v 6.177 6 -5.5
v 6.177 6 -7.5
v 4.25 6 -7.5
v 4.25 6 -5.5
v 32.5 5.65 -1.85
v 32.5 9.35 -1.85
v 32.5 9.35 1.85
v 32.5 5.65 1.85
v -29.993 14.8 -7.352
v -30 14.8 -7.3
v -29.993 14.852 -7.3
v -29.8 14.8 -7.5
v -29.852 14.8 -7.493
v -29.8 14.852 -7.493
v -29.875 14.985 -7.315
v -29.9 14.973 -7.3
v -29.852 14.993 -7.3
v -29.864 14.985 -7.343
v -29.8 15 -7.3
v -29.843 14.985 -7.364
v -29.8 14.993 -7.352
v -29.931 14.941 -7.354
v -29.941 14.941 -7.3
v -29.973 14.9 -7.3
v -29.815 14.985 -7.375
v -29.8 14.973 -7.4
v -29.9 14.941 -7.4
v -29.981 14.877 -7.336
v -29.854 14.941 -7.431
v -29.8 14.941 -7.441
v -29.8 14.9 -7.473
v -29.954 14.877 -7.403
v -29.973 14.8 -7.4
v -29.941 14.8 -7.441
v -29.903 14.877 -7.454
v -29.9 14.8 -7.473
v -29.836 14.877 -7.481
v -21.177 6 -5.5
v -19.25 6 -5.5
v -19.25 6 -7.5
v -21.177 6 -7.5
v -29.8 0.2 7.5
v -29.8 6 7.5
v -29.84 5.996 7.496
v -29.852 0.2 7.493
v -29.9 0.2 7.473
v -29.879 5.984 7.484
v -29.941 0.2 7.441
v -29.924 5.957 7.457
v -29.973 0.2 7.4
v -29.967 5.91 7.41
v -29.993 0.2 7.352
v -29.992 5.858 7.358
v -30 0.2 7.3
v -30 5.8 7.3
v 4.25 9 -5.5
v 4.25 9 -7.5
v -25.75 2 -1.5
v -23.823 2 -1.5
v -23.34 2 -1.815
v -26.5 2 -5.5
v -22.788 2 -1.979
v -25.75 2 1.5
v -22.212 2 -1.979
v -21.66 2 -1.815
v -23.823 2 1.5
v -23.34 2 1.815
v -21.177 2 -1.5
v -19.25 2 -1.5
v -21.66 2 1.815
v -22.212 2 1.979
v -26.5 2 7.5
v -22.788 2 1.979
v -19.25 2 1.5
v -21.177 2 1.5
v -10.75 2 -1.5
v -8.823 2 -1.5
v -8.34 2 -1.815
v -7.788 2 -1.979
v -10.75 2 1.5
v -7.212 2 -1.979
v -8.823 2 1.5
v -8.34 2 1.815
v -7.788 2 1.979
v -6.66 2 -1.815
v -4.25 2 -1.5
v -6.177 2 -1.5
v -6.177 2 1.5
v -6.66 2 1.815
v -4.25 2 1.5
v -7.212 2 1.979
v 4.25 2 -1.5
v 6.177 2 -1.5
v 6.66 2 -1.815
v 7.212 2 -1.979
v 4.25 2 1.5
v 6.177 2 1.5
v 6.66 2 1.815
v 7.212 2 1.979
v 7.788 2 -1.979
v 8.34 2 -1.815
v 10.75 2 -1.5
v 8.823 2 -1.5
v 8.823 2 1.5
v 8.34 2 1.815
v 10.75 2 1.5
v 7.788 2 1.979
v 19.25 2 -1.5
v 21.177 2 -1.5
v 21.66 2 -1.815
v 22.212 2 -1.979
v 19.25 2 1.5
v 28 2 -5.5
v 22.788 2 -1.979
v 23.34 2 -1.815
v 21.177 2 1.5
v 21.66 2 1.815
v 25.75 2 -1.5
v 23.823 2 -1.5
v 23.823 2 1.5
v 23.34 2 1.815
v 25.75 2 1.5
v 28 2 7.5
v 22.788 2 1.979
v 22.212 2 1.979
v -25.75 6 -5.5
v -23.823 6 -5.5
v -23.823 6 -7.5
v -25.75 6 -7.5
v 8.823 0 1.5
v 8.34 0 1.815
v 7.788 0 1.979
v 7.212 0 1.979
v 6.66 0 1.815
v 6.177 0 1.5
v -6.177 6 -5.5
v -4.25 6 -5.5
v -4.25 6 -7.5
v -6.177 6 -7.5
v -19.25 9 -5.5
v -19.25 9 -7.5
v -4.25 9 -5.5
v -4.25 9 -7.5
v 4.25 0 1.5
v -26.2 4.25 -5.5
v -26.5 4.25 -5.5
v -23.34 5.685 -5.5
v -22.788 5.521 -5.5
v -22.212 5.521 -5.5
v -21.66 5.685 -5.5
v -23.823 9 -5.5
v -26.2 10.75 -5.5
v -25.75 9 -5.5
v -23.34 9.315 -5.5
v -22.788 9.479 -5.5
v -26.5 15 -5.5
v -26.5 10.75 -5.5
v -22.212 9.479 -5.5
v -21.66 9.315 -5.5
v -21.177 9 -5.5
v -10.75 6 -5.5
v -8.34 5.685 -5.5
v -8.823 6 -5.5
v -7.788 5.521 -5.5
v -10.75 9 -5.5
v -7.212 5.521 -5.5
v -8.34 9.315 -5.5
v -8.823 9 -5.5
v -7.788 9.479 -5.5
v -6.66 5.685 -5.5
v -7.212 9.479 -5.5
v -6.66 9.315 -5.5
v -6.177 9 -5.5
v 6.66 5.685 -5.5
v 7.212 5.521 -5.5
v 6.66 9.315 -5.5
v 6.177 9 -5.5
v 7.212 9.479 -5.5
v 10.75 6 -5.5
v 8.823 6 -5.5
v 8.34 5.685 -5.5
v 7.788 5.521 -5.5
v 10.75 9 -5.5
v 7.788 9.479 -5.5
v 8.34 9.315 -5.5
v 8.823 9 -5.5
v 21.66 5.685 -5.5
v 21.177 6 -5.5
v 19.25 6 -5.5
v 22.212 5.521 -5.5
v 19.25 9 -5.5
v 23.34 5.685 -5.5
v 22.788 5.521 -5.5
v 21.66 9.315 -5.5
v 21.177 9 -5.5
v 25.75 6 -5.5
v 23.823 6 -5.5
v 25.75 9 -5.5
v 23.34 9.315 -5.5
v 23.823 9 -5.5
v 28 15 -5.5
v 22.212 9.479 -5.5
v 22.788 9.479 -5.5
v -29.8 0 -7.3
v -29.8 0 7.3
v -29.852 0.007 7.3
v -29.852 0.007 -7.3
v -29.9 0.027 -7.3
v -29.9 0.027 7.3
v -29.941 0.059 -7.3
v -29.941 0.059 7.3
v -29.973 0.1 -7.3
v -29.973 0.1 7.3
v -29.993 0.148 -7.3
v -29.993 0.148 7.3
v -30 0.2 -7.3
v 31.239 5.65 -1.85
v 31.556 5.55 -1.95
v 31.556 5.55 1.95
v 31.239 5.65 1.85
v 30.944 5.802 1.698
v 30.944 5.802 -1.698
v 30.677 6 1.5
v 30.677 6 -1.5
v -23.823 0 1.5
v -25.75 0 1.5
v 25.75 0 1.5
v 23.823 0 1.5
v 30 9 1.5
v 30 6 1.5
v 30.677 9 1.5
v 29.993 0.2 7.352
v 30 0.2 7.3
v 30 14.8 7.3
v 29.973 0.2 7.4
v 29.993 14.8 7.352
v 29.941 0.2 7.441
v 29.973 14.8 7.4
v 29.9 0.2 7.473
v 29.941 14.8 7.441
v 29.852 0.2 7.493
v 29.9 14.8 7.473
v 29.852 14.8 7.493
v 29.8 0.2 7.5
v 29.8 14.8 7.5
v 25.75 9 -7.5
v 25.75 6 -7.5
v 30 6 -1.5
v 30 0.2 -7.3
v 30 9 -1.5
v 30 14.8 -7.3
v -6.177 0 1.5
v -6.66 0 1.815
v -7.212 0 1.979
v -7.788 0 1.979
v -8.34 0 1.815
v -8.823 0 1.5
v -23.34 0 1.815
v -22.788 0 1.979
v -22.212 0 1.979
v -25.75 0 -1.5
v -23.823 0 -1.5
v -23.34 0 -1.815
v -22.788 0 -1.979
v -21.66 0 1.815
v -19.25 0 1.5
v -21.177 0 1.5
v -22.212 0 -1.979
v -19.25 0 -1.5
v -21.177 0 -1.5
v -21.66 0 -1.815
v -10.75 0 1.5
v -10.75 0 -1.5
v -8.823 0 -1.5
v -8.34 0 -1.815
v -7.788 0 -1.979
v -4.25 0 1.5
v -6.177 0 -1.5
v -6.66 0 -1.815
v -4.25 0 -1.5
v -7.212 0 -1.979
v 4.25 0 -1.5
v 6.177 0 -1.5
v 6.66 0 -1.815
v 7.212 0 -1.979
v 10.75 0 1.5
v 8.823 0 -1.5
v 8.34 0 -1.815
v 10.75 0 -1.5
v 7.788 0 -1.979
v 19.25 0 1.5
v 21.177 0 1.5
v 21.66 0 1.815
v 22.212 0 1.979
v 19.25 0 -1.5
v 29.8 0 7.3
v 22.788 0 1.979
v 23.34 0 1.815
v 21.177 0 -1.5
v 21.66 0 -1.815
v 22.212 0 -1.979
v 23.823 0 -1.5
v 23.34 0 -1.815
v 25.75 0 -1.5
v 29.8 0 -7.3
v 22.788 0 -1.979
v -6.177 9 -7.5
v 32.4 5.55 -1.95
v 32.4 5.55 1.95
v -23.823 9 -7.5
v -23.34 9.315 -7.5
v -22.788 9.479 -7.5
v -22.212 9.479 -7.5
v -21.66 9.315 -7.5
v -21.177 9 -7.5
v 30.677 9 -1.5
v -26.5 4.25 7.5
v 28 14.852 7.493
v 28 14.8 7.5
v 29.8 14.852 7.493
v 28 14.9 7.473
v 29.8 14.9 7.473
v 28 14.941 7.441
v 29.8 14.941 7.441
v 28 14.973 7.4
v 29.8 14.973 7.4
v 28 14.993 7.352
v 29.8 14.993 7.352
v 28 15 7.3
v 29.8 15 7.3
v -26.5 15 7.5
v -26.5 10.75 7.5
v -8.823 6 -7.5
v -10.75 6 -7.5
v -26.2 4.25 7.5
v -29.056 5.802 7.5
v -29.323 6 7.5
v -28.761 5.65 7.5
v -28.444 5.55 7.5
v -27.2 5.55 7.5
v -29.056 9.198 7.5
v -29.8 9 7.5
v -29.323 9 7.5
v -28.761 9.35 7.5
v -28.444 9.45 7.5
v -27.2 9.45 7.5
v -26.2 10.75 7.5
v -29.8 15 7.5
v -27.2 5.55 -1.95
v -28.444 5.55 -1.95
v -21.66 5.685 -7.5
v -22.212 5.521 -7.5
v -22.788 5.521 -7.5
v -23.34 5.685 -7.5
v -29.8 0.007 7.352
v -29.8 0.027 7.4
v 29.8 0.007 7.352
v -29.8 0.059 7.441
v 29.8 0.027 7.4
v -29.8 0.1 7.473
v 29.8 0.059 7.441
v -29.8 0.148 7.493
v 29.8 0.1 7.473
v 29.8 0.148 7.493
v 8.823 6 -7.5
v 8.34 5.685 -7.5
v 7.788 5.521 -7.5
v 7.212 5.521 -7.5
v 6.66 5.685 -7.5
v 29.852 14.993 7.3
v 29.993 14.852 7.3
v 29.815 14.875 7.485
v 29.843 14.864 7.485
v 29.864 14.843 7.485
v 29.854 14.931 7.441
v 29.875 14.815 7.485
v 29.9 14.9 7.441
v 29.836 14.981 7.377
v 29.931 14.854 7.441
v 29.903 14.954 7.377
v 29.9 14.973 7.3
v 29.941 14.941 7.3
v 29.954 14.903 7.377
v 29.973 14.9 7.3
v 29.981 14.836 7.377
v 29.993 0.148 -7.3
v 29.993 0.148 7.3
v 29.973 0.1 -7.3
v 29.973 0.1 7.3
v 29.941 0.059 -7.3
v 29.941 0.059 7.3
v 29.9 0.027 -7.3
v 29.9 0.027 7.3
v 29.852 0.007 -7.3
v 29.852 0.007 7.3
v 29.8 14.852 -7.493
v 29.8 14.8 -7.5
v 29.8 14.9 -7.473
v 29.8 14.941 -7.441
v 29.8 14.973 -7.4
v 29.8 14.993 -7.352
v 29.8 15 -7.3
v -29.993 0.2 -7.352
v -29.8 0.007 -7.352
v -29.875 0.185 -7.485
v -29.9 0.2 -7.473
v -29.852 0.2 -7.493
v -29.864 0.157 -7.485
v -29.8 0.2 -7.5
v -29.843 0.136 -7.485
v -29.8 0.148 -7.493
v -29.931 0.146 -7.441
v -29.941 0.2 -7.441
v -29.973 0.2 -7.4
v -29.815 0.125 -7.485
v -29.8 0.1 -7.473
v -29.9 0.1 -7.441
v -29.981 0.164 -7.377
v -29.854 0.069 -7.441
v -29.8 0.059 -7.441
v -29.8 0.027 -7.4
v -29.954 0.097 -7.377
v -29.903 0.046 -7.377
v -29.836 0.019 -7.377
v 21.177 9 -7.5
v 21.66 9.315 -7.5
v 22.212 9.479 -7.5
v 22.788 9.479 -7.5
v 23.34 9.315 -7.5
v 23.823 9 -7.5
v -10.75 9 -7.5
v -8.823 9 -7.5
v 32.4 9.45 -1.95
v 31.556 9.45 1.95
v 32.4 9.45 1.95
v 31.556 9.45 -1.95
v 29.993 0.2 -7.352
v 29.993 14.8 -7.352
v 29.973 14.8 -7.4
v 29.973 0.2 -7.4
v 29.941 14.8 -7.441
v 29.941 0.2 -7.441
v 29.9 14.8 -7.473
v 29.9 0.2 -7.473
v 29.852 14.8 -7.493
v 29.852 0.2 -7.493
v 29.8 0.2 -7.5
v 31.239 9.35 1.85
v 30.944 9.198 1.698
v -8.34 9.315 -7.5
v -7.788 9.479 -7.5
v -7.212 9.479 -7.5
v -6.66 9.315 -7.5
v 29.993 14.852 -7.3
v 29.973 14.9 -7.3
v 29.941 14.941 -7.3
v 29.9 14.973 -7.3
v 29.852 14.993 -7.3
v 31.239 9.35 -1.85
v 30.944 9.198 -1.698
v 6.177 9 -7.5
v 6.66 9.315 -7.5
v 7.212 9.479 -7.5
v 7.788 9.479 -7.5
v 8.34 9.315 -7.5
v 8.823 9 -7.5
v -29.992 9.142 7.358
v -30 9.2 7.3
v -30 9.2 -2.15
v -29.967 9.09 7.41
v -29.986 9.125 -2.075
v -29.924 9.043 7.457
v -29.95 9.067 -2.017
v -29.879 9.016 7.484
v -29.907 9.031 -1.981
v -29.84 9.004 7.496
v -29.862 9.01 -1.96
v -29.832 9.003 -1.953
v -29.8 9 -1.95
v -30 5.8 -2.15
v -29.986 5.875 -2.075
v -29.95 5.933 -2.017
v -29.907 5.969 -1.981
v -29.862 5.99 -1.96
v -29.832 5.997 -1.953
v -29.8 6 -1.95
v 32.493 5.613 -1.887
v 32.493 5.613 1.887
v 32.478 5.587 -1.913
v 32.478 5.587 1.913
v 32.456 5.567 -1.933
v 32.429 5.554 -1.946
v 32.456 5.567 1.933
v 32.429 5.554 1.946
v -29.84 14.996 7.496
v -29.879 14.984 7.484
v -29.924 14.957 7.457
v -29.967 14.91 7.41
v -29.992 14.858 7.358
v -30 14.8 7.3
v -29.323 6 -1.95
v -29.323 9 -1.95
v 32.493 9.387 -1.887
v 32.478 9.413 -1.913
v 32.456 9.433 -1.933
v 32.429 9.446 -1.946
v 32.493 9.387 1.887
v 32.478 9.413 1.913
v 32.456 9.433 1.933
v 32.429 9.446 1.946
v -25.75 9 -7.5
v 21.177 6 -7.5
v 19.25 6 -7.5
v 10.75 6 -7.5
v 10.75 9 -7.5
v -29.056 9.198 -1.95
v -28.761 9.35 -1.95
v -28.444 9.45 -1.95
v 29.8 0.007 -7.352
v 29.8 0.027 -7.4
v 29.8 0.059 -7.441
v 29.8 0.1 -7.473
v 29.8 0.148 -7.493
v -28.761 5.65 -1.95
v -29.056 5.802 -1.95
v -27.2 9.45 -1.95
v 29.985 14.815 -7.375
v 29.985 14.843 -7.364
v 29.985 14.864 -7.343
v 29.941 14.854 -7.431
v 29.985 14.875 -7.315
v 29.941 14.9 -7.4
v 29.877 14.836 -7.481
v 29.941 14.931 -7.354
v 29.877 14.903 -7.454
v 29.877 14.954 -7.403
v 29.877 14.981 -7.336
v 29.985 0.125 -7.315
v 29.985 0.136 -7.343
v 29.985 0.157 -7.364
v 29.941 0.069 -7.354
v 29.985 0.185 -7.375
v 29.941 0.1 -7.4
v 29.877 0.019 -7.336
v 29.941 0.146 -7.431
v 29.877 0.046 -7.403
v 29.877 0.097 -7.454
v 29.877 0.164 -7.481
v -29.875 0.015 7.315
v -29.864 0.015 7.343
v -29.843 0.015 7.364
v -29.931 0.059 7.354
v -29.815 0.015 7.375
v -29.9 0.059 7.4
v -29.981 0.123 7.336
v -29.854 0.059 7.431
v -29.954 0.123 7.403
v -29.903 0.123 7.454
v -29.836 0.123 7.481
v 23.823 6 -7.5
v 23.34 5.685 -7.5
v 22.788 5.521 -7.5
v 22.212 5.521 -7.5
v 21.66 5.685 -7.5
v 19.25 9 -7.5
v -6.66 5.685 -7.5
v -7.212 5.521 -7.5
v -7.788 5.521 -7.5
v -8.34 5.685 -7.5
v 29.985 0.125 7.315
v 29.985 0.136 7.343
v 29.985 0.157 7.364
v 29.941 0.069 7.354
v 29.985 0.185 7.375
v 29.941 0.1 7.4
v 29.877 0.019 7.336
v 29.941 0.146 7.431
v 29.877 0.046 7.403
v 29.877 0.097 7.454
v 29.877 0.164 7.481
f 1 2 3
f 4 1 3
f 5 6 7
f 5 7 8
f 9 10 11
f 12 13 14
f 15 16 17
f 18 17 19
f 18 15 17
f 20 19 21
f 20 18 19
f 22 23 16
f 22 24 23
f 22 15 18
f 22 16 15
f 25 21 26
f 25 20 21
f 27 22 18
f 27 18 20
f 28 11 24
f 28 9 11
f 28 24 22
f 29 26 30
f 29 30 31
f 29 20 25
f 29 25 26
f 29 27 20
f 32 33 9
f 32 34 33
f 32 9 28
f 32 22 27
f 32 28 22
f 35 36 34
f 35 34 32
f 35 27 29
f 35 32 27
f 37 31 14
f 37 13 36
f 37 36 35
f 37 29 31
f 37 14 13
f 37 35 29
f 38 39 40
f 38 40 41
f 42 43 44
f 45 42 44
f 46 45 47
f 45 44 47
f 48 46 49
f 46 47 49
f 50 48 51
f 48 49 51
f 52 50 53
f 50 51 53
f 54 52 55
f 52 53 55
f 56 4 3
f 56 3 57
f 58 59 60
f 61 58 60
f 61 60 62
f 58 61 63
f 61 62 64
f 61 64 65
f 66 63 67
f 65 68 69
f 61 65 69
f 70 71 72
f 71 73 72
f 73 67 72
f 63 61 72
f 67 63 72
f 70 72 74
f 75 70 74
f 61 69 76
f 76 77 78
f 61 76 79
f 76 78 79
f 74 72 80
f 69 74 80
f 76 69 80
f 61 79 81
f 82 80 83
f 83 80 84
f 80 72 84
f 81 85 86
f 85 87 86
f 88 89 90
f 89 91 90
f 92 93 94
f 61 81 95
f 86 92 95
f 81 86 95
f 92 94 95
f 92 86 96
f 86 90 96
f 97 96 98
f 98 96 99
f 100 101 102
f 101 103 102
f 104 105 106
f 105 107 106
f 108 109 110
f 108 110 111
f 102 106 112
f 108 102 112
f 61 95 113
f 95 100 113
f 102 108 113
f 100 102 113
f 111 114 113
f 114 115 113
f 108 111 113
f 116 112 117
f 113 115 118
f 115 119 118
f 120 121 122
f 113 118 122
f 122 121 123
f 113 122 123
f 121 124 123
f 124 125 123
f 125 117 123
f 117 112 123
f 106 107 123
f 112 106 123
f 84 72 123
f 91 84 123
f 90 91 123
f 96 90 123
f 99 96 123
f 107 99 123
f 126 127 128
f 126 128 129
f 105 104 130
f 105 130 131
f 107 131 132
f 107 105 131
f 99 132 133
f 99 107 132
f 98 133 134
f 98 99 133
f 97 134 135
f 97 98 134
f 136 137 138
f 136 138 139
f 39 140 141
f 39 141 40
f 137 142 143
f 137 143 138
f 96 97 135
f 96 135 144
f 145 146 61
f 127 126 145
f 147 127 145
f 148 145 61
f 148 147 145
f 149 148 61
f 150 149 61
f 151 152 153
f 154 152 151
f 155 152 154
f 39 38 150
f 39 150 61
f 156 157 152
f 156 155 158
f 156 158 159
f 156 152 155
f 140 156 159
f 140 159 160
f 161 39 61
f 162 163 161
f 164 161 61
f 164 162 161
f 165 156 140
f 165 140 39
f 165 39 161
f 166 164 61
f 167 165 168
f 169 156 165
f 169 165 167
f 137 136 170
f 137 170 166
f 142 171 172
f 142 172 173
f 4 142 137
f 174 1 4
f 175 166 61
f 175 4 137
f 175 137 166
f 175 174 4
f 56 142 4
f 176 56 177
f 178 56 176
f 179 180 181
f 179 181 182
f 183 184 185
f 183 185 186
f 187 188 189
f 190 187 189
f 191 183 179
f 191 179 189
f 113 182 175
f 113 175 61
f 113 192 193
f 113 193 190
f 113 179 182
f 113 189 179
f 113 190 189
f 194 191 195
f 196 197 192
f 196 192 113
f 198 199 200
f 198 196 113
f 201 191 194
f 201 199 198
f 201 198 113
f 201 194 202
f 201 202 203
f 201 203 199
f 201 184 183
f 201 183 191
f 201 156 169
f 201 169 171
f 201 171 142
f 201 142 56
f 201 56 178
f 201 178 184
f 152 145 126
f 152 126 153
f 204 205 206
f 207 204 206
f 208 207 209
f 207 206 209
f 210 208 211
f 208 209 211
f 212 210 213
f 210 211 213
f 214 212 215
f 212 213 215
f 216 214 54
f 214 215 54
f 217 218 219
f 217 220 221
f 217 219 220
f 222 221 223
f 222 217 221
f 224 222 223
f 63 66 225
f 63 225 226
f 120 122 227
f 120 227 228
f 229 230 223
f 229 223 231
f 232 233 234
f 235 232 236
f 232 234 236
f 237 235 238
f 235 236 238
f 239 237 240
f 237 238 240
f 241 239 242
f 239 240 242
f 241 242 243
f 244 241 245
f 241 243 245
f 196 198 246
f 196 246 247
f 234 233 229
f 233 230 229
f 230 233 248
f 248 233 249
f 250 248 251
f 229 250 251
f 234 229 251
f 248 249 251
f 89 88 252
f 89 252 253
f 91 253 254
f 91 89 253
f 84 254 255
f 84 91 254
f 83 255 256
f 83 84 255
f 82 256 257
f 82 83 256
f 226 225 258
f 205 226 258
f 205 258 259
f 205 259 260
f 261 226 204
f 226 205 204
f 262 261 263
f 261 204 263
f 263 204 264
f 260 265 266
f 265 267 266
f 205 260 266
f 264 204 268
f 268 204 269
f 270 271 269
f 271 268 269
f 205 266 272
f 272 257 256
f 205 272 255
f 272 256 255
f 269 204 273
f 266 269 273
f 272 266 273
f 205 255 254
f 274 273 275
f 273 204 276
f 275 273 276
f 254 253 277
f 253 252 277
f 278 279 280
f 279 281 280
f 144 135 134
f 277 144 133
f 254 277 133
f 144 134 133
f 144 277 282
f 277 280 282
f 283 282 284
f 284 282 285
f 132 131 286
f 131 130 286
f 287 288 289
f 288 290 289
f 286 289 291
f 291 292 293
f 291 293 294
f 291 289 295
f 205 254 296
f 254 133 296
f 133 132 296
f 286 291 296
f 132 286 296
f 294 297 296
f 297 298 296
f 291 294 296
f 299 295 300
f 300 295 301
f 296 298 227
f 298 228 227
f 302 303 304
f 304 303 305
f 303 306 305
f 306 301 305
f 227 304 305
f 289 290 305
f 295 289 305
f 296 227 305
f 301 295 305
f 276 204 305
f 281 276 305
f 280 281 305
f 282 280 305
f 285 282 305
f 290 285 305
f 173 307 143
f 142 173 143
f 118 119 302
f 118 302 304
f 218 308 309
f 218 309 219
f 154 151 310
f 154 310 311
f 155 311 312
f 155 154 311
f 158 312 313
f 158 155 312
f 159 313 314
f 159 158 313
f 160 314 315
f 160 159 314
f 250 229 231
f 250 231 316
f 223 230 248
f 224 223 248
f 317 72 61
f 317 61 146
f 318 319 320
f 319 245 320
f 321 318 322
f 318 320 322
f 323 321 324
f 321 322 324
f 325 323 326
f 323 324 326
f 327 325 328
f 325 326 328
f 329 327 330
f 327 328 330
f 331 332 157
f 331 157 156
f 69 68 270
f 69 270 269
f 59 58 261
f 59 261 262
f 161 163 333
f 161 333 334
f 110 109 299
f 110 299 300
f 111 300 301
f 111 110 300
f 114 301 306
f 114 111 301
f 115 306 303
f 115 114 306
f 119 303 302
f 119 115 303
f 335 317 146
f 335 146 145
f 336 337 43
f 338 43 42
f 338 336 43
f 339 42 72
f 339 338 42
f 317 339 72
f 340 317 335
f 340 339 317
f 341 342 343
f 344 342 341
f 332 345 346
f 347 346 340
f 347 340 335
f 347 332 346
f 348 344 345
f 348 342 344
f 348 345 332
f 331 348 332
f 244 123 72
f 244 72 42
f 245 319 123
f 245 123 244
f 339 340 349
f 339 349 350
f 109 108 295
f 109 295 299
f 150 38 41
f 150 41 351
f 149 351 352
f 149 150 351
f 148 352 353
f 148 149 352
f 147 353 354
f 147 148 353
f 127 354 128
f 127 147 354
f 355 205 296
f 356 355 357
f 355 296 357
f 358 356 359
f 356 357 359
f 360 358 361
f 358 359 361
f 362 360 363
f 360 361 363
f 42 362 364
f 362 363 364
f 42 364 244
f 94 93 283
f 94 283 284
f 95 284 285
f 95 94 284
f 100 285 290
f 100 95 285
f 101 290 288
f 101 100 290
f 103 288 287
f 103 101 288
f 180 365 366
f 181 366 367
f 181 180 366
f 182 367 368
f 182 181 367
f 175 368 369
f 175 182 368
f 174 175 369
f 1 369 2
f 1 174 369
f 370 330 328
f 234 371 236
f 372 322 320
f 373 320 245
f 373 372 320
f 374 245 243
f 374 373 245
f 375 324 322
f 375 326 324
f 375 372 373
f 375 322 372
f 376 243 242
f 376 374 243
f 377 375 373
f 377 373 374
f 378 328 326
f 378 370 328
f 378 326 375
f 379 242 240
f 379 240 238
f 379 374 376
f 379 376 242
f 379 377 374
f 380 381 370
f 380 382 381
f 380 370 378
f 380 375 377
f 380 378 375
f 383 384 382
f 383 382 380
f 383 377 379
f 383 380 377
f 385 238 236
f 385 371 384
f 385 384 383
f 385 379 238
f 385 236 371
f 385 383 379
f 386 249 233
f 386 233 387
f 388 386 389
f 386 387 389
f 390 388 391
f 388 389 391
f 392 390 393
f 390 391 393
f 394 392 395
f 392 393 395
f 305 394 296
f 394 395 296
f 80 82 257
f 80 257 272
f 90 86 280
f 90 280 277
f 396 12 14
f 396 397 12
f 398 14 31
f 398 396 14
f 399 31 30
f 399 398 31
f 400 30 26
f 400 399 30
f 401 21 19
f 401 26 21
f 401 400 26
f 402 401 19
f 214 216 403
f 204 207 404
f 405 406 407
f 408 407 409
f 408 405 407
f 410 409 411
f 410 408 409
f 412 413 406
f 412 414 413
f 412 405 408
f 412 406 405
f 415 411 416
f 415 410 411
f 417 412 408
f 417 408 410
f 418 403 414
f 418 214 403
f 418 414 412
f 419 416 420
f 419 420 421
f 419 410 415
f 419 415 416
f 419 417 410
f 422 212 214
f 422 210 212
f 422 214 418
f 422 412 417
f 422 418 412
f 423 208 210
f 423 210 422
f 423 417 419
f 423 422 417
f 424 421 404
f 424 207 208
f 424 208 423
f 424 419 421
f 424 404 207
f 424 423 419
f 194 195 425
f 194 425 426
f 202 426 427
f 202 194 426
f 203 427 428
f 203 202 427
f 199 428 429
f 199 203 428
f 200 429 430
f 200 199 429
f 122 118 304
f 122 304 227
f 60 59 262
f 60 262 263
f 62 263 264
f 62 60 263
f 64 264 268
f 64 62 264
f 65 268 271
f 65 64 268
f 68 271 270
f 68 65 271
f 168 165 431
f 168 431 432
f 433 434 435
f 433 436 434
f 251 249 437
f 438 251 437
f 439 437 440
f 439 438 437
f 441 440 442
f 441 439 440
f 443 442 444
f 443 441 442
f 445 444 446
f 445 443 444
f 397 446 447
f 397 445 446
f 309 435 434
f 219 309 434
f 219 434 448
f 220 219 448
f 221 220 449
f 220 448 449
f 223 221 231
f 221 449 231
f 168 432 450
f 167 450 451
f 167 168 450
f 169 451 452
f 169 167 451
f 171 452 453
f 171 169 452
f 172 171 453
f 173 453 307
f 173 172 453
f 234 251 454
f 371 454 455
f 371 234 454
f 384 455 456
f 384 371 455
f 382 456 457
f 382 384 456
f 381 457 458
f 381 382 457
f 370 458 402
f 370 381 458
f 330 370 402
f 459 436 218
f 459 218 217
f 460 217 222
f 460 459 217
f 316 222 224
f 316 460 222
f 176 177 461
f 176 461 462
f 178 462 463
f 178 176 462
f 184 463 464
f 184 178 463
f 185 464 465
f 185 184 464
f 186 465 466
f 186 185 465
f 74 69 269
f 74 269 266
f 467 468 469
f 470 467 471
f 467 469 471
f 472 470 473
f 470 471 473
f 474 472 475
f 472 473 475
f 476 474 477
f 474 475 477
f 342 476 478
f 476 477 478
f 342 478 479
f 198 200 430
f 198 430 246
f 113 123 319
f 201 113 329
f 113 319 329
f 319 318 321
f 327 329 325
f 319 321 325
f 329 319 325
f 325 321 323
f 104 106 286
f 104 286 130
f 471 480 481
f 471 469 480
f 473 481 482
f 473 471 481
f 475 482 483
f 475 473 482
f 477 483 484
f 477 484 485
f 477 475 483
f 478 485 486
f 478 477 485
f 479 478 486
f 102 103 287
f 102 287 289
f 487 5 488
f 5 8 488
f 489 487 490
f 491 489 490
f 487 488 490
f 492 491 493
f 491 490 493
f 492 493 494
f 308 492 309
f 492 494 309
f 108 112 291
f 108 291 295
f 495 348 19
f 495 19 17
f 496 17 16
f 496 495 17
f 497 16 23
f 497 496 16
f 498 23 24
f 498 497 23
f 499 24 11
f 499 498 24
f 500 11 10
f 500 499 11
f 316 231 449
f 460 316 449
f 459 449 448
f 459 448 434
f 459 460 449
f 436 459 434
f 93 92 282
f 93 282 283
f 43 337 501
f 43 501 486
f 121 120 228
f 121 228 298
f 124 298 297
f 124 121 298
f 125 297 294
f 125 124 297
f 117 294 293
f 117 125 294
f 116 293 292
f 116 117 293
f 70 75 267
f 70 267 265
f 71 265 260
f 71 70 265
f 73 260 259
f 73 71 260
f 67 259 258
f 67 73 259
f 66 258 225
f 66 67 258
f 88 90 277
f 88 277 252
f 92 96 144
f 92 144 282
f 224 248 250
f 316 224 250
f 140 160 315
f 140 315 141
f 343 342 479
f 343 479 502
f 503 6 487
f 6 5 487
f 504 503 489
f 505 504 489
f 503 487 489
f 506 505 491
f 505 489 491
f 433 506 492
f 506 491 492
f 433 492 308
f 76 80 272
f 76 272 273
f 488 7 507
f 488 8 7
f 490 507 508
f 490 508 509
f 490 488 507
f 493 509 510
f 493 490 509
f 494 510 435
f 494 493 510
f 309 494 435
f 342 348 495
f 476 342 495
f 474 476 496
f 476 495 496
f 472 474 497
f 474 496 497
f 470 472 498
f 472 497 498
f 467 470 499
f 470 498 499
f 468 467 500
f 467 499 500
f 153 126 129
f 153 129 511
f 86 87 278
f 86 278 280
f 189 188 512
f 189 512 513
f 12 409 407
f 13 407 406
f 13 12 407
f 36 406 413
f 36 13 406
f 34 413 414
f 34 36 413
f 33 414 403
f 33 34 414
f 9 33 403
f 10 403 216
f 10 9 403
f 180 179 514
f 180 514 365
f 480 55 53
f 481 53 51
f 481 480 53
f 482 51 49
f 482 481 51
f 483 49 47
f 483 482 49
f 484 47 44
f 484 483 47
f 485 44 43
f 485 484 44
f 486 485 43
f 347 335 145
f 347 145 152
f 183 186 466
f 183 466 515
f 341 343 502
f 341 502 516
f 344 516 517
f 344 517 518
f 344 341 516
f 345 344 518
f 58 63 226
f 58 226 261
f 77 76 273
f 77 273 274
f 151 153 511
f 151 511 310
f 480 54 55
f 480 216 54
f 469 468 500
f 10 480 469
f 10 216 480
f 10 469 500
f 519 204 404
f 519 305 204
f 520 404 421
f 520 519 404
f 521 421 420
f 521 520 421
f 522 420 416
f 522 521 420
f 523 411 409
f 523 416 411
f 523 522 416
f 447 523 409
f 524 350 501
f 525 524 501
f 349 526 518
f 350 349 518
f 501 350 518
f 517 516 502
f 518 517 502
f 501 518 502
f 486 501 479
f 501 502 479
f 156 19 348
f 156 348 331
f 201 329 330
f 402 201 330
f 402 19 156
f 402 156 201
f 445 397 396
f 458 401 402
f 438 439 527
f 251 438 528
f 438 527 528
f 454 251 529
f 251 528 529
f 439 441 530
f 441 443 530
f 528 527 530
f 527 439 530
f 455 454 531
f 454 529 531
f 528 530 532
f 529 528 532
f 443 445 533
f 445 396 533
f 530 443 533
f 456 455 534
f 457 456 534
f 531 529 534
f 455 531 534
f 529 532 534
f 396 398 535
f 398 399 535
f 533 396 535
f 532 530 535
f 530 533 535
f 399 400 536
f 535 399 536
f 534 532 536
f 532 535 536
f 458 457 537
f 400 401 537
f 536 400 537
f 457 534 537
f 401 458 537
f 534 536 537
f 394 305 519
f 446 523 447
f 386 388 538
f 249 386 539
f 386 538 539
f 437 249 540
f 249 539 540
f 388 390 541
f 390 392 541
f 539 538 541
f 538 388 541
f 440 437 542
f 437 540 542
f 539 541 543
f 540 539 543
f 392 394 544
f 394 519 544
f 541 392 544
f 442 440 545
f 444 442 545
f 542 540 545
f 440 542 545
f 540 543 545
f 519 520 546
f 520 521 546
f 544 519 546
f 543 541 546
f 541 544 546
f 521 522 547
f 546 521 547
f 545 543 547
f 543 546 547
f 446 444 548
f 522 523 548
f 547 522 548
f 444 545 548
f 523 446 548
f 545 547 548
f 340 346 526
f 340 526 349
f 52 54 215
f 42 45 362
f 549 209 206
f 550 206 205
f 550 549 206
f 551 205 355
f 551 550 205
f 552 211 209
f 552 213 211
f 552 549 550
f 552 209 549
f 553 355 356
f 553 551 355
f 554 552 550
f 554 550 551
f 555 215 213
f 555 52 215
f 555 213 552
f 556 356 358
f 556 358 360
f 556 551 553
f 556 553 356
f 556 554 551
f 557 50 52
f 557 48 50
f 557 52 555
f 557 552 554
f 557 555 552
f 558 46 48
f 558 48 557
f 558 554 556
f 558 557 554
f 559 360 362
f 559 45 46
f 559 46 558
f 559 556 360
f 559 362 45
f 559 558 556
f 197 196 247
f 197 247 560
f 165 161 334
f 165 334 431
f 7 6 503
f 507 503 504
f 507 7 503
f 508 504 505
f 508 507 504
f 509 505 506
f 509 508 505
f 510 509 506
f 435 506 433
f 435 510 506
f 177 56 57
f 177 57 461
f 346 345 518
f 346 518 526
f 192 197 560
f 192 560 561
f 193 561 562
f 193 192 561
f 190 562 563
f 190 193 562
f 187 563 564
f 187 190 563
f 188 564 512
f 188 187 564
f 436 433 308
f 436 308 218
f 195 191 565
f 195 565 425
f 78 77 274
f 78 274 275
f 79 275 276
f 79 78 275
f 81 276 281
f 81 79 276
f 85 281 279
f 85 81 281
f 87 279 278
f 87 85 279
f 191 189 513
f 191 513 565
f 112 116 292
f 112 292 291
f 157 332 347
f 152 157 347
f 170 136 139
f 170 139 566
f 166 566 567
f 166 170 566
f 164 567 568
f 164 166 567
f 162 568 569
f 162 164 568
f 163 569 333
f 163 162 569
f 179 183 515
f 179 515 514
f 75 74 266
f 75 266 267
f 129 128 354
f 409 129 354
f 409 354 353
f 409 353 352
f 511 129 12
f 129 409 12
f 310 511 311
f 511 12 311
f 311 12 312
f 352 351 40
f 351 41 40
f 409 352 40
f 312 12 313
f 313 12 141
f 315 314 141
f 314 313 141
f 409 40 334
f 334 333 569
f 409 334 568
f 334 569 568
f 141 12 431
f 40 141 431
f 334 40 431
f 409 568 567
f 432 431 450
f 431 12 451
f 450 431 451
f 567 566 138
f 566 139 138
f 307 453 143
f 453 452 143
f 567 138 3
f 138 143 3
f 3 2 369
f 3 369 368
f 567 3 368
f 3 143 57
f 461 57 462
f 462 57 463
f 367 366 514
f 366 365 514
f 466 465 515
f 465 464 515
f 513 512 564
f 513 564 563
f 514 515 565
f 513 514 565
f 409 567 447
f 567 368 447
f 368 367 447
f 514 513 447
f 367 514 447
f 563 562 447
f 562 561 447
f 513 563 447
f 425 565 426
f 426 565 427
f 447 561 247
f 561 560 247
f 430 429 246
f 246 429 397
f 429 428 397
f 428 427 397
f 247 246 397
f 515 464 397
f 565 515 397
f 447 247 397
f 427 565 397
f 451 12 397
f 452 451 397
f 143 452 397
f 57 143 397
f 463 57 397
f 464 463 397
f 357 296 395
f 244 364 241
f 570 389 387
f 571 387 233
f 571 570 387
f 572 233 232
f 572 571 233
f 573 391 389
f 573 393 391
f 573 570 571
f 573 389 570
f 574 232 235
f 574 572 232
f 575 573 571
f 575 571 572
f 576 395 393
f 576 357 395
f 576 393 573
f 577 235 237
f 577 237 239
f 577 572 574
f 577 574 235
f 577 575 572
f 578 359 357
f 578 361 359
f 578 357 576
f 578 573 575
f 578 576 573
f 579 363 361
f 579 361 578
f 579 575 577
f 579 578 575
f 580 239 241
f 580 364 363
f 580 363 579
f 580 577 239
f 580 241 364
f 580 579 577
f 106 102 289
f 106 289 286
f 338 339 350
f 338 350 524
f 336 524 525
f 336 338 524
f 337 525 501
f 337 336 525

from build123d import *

# Parameters (mm, degrees)
EXTRUDE_1_DEPTH      = 7.5
EXTRUDE_1_DEPTH_BACK = 7.5
SKETCH_1_W           = 60
SKETCH_1_H           = 15
SKETCH_2_W           = 3
SKETCH_2_H           = 3
EXTRUDE_2_DEPTH      = 1
EXTRUDE_3_DEPTH      = 1
EXTRUDE_3_DEPTH_BACK = 4
CUT_EXTRUDE_1_REACH  = 36.667
SKETCH_5_W           = 54.5
SKETCH_5_H           = 13
CUT_EXTRUDE_2_DEPTH  = 13
CUT_EXTRUDE_3_DEPTH  = 9.45
EXTRUDE_4_REACH      = 40.81
SKETCH_7_W           = 0.3
SKETCH_7_H           = 6.5
CUT_EXTRUDE_4_REACH  = 40.082
CUT_EXTRUDE_5_REACH  = 37.798
FILLET_1_R           = 0.1
FILLET_2_R           = 0.2


with BuildPart() as part:
    # Sketch 1 → Extrude 1 (new, two sides: drawn at the far end of the back side and taken through both)
    with BuildSketch(Plane.XY.offset(-EXTRUDE_1_DEPTH_BACK)):
        with Locations((0, 7.5)):
            Rectangle(SKETCH_1_W, SKETCH_1_H)
    extrude(amount=EXTRUDE_1_DEPTH + EXTRUDE_1_DEPTH_BACK)

    # Sketch 2 → Extrude 2 (add)
    with BuildSketch(Plane(origin=(30, 0, 0), x_dir=(0, 0, -1), z_dir=(1, 0, 0))):
        with Locations((0, 7.5)):
            Rectangle(SKETCH_2_W, SKETCH_2_H)
    extrude(amount=EXTRUDE_2_DEPTH)

    # Sketch 3 → Extrude 3 (add, two sides: drawn at the far end of the back side and taken through both)
    with BuildSketch(Plane.XY.offset(1.5).offset(-EXTRUDE_3_DEPTH_BACK)):
        with BuildLine():
            Line((32.5, 9.45), (32.5, 5.55))
            Line((32.5, 5.55), (31.555590279, 5.55))
            ThreePointArc((31.555590279, 5.55), (31.088161527, 5.719957697), (30.677124344, 6))
            Line((30.677124344, 6), (30.677124344, 9))
            ThreePointArc((30.677124344, 9), (31.088161527, 9.280042303), (31.555590279, 9.45))
            Line((31.555590279, 9.45), (32.5, 9.45))
        make_face()
    extrude(amount=EXTRUDE_3_DEPTH + EXTRUDE_3_DEPTH_BACK)

    # Sketch 4 → Cut-Extrude 1 (cut, up to next)
    with BuildSketch(Plane(origin=(0, 9.45, 0), x_dir=(-1, 0, 0), z_dir=(0, 1, 0)), mode=Mode.PRIVATE) as cut_extrude_1_sk1:
        with BuildLine():
            Line((-32.5, -1.95), (-31.555590279, -1.95))
            ThreePointArc((-31.555590279, -1.95), (-31.088161527, -1.780042303), (-30.677124344, -1.5))
            Line((-30.677124344, -1.5), (-30.677124344, -2.5))
            Line((-30.677124344, -2.5), (-32.5, -2.5))
            Line((-32.5, -2.5), (-32.5, -1.95))
        make_face()
    cut_extrude_1_tool1 = extrude(cut_extrude_1_sk1.sketch, amount=-CUT_EXTRUDE_1_REACH, mode=Mode.PRIVATE) & part.part
    # Sketch 4 → Cut-Extrude 1 (cut, up to next)
    with BuildSketch(Plane(origin=(0, 9.45, 0), x_dir=(-1, 0, 0), z_dir=(0, 1, 0)), mode=Mode.PRIVATE) as cut_extrude_1_sk2:
        with BuildLine():
            Line((-30.677124344, 2.5), (-32.5, 2.5))
            Line((-32.5, 2.5), (-32.5, 1.95))
            Line((-32.5, 1.95), (-31.555590279, 1.95))
            ThreePointArc((-31.555590279, 1.95), (-31.088161527, 1.780042303), (-30.677124344, 1.5))
            Line((-30.677124344, 1.5), (-30.677124344, 2.5))
        make_face()
    cut_extrude_1_tool2 = extrude(cut_extrude_1_sk2.sketch, amount=-CUT_EXTRUDE_1_REACH, mode=Mode.PRIVATE) & part.part
    add(cut_extrude_1_tool1.solids().sort_by_distance((31.500125, 9.45, -2.169375))[0], mode=Mode.SUBTRACT)
    add(cut_extrude_1_tool2.solids().sort_by_distance((31.500125, 9.45, 2.169375))[0], mode=Mode.SUBTRACT)

    # Sketch 5 → Cut-Extrude 2 (cut)
    with BuildSketch(Plane.XY.offset(7.5)):
        with Locations((0.75, 8.5)):
            Rectangle(SKETCH_5_W, SKETCH_5_H)
    extrude(amount=-CUT_EXTRUDE_2_DEPTH, mode=Mode.SUBTRACT)

    # Sketch 6 → Cut-Extrude 3 (cut)
    with BuildSketch(Plane.XY.offset(7.5)):
        with BuildLine():
            Line((-27.2, 9.45), (-27.2, 5.55))
            Line((-27.2, 5.55), (-28.444409721, 5.55))
            ThreePointArc((-28.444409721, 5.55), (-28.911838473, 5.719957697), (-29.322875656, 6))
            Line((-29.322875656, 6), (-30, 6))
            Line((-30, 6), (-30, 9))
            Line((-30, 9), (-29.322875656, 9))
            ThreePointArc((-29.322875656, 9), (-28.911838473, 9.280042303), (-28.444409721, 9.45))
            Line((-28.444409721, 9.45), (-27.2, 9.45))
        make_face()
    extrude(amount=-CUT_EXTRUDE_3_DEPTH, mode=Mode.SUBTRACT)

    # Sketch 7 → Extrude 4 (add, up to next)
    with BuildSketch(Plane.XY.offset(7.5), mode=Mode.PRIVATE) as extrude_4_sk1:
        with Locations((-26.35, 7.5)):
            Rectangle(SKETCH_7_W, SKETCH_7_H)
    extrude_4_tool1 = extrude(extrude_4_sk1.sketch, amount=-EXTRUDE_4_REACH, mode=Mode.PRIVATE) - part.part
    add(extrude_4_tool1.solids().sort_by_distance((-26.35, 7.5, 7.5))[0])

    # Sketch 8 → Cut-Extrude 4 (cut, up to next)
    with BuildSketch(Plane.XY.offset(-5.5), mode=Mode.PRIVATE) as cut_extrude_4_sk1:
        with BuildLine():
            Line((-21.177124344, 9), (-19.25, 9))
            Line((-19.25, 9), (-19.25, 6))
            Line((-19.25, 6), (-21.177124344, 6))
            ThreePointArc((-21.177124344, 6), (-22.5, 5.5), (-23.822875656, 6))
            Line((-23.822875656, 6), (-25.75, 6))
            Line((-25.75, 6), (-25.75, 9))
            Line((-25.75, 9), (-23.822875656, 9))
            ThreePointArc((-23.822875656, 9), (-22.5, 9.5), (-21.177124344, 9))
        make_face()
    cut_extrude_4_tool1 = extrude(cut_extrude_4_sk1.sketch, amount=-CUT_EXTRUDE_4_REACH, mode=Mode.PRIVATE) & part.part
    # Sketch 8 → Cut-Extrude 4 (cut, up to next)
    with BuildSketch(Plane.XY.offset(-5.5), mode=Mode.PRIVATE) as cut_extrude_4_sk2:
        with BuildLine():
            Line((-10.75, 9), (-8.822875656, 9))
            ThreePointArc((-8.822875656, 9), (-7.5, 9.5), (-6.177124344, 9))
            Line((-6.177124344, 9), (-4.25, 9))
            Line((-4.25, 9), (-4.25, 6))
            Line((-4.25, 6), (-6.177124344, 6))
            ThreePointArc((-6.177124344, 6), (-7.5, 5.5), (-8.822875656, 6))
            Line((-8.822875656, 6), (-10.75, 6))
            Line((-10.75, 6), (-10.75, 9))
        make_face()
    cut_extrude_4_tool2 = extrude(cut_extrude_4_sk2.sketch, amount=-CUT_EXTRUDE_4_REACH, mode=Mode.PRIVATE) & part.part
    # Sketch 8 → Cut-Extrude 4 (cut, up to next)
    with BuildSketch(Plane.XY.offset(-5.5), mode=Mode.PRIVATE) as cut_extrude_4_sk3:
        with BuildLine():
            Line((6.177124344, 6), (4.25, 6))
            Line((4.25, 6), (4.25, 9))
            Line((4.25, 9), (6.177124344, 9))
            ThreePointArc((6.177124344, 9), (7.5, 9.5), (8.822875656, 9))
            Line((8.822875656, 9), (10.75, 9))
            Line((10.75, 9), (10.75, 6))
            Line((10.75, 6), (8.822875656, 6))
            ThreePointArc((8.822875656, 6), (7.5, 5.5), (6.177124344, 6))
        make_face()
    cut_extrude_4_tool3 = extrude(cut_extrude_4_sk3.sketch, amount=-CUT_EXTRUDE_4_REACH, mode=Mode.PRIVATE) & part.part
    # Sketch 8 → Cut-Extrude 4 (cut, up to next)
    with BuildSketch(Plane.XY.offset(-5.5), mode=Mode.PRIVATE) as cut_extrude_4_sk4:
        with BuildLine():
            Line((21.177124344, 6), (19.25, 6))
            Line((19.25, 6), (19.25, 9))
            Line((19.25, 9), (21.177124344, 9))
            ThreePointArc((21.177124344, 9), (22.5, 9.5), (23.822875656, 9))
            Line((23.822875656, 9), (25.75, 9))
            Line((25.75, 9), (25.75, 6))
            Line((25.75, 6), (23.822875656, 6))
            ThreePointArc((23.822875656, 6), (22.5, 5.5), (21.177124344, 6))
        make_face()
    cut_extrude_4_tool4 = extrude(cut_extrude_4_sk4.sketch, amount=-CUT_EXTRUDE_4_REACH, mode=Mode.PRIVATE) & part.part
    add(cut_extrude_4_tool1.solids().sort_by_distance((-22.5, 7.5, -5.5))[0], mode=Mode.SUBTRACT)
    add(cut_extrude_4_tool2.solids().sort_by_distance((-7.5, 7.5, -5.5))[0], mode=Mode.SUBTRACT)
    add(cut_extrude_4_tool3.solids().sort_by_distance((7.5, 7.5, -5.5))[0], mode=Mode.SUBTRACT)
    add(cut_extrude_4_tool4.solids().sort_by_distance((22.5, 7.5, -5.5))[0], mode=Mode.SUBTRACT)

    # Sketch 9 → Cut-Extrude 5 (cut, up to next)
    with BuildSketch(Plane(origin=(0, 2, 0), x_dir=(-1, 0, 0), z_dir=(0, 1, 0)), mode=Mode.PRIVATE) as cut_extrude_5_sk1:
        with BuildLine():
            Line((21.177124344, -1.5), (19.25, -1.5))
            Line((19.25, -1.5), (19.25, 1.5))
            Line((19.25, 1.5), (21.177124344, 1.5))
            ThreePointArc((21.177124344, 1.5), (22.5, 2), (23.822875656, 1.5))
            Line((23.822875656, 1.5), (25.75, 1.5))
            Line((25.75, 1.5), (25.75, -1.5))
            Line((25.75, -1.5), (23.822875656, -1.5))
            ThreePointArc((23.822875656, -1.5), (22.5, -2), (21.177124344, -1.5))
        make_face()
    cut_extrude_5_tool1 = extrude(cut_extrude_5_sk1.sketch, amount=-CUT_EXTRUDE_5_REACH, mode=Mode.PRIVATE) & part.part
    # Sketch 9 → Cut-Extrude 5 (cut, up to next)
    with BuildSketch(Plane(origin=(0, 2, 0), x_dir=(-1, 0, 0), z_dir=(0, 1, 0)), mode=Mode.PRIVATE) as cut_extrude_5_sk2:
        with BuildLine():
            Line((10.75, -1.5), (8.822875656, -1.5))
            ThreePointArc((8.822875656, -1.5), (7.5, -2), (6.177124344, -1.5))
            Line((6.177124344, -1.5), (4.25, -1.5))
            Line((4.25, -1.5), (4.25, 1.5))
            Line((4.25, 1.5), (6.177124344, 1.5))
            ThreePointArc((6.177124344, 1.5), (7.5, 2), (8.822875656, 1.5))
            Line((8.822875656, 1.5), (10.75, 1.5))
            Line((10.75, 1.5), (10.75, -1.5))
        make_face()
    cut_extrude_5_tool2 = extrude(cut_extrude_5_sk2.sketch, amount=-CUT_EXTRUDE_5_REACH, mode=Mode.PRIVATE) & part.part
    # Sketch 9 → Cut-Extrude 5 (cut, up to next)
    with BuildSketch(Plane(origin=(0, 2, 0), x_dir=(-1, 0, 0), z_dir=(0, 1, 0)), mode=Mode.PRIVATE) as cut_extrude_5_sk3:
        with BuildLine():
            Line((-6.177124344, 1.5), (-4.25, 1.5))
            Line((-4.25, 1.5), (-4.25, -1.5))
            Line((-4.25, -1.5), (-6.177124344, -1.5))
            ThreePointArc((-6.177124344, -1.5), (-7.5, -2), (-8.822875656, -1.5))
            Line((-8.822875656, -1.5), (-10.75, -1.5))
            Line((-10.75, -1.5), (-10.75, 1.5))
            Line((-10.75, 1.5), (-8.822875656, 1.5))
            ThreePointArc((-8.822875656, 1.5), (-7.5, 2), (-6.177124344, 1.5))
        make_face()
    cut_extrude_5_tool3 = extrude(cut_extrude_5_sk3.sketch, amount=-CUT_EXTRUDE_5_REACH, mode=Mode.PRIVATE) & part.part
    # Sketch 9 → Cut-Extrude 5 (cut, up to next)
    with BuildSketch(Plane(origin=(0, 2, 0), x_dir=(-1, 0, 0), z_dir=(0, 1, 0)), mode=Mode.PRIVATE) as cut_extrude_5_sk4:
        with BuildLine():
            Line((-21.177124344, 1.5), (-19.25, 1.5))
            Line((-19.25, 1.5), (-19.25, -1.5))
            Line((-19.25, -1.5), (-21.177124344, -1.5))
            ThreePointArc((-21.177124344, -1.5), (-22.5, -2), (-23.822875656, -1.5))
            Line((-23.822875656, -1.5), (-25.75, -1.5))
            Line((-25.75, -1.5), (-25.75, 1.5))
            Line((-25.75, 1.5), (-23.822875656, 1.5))
            ThreePointArc((-23.822875656, 1.5), (-22.5, 2), (-21.177124344, 1.5))
        make_face()
    cut_extrude_5_tool4 = extrude(cut_extrude_5_sk4.sketch, amount=-CUT_EXTRUDE_5_REACH, mode=Mode.PRIVATE) & part.part
    add(cut_extrude_5_tool1.solids().sort_by_distance((-22.5, 2, 0))[0], mode=Mode.SUBTRACT)
    add(cut_extrude_5_tool2.solids().sort_by_distance((-7.5, 2, 0))[0], mode=Mode.SUBTRACT)
    add(cut_extrude_5_tool3.solids().sort_by_distance((7.5, 2, 0))[0], mode=Mode.SUBTRACT)
    add(cut_extrude_5_tool4.solids().sort_by_distance((22.5, 2, 0))[0], mode=Mode.SUBTRACT)

    # Fillet 1
    fillet_1_edges = [part.edges().sort_by_distance(p)[0] for p in [
        (32.5, 5.55, 0),
        (32.5, 9.45, 0),
        (32.5, 7.5, -1.95),
        (32.5, 7.5, 1.95),
    ]]
    fillet(fillet_1_edges, radius=FILLET_1_R)

    # Fillet 2
    fillet_2_edges = [part.edges().sort_by_distance(p)[0] for p in [
        (-30, 3, 7.5),
        (-30, 0, 0),
        (-30, 7.5, -7.5),
        (-30, 15, 0),
        (-30, 12, 7.5),
        (-30, 9, 2.775),
        (-30, 7.5, -1.95),
        (-30, 6, 2.775),
        (0, 0, -7.5),
        (0, 0, 7.5),
        (0, 15, -7.5),
        (30, 0, 0),
        (30, 7.5, -7.5),
        (30, 15, 0),
        (29, 15, 7.5),
        (30, 7.5, 7.5),
    ]]
    fillet(fillet_2_edges, radius=FILLET_2_R)


solid = part.part
